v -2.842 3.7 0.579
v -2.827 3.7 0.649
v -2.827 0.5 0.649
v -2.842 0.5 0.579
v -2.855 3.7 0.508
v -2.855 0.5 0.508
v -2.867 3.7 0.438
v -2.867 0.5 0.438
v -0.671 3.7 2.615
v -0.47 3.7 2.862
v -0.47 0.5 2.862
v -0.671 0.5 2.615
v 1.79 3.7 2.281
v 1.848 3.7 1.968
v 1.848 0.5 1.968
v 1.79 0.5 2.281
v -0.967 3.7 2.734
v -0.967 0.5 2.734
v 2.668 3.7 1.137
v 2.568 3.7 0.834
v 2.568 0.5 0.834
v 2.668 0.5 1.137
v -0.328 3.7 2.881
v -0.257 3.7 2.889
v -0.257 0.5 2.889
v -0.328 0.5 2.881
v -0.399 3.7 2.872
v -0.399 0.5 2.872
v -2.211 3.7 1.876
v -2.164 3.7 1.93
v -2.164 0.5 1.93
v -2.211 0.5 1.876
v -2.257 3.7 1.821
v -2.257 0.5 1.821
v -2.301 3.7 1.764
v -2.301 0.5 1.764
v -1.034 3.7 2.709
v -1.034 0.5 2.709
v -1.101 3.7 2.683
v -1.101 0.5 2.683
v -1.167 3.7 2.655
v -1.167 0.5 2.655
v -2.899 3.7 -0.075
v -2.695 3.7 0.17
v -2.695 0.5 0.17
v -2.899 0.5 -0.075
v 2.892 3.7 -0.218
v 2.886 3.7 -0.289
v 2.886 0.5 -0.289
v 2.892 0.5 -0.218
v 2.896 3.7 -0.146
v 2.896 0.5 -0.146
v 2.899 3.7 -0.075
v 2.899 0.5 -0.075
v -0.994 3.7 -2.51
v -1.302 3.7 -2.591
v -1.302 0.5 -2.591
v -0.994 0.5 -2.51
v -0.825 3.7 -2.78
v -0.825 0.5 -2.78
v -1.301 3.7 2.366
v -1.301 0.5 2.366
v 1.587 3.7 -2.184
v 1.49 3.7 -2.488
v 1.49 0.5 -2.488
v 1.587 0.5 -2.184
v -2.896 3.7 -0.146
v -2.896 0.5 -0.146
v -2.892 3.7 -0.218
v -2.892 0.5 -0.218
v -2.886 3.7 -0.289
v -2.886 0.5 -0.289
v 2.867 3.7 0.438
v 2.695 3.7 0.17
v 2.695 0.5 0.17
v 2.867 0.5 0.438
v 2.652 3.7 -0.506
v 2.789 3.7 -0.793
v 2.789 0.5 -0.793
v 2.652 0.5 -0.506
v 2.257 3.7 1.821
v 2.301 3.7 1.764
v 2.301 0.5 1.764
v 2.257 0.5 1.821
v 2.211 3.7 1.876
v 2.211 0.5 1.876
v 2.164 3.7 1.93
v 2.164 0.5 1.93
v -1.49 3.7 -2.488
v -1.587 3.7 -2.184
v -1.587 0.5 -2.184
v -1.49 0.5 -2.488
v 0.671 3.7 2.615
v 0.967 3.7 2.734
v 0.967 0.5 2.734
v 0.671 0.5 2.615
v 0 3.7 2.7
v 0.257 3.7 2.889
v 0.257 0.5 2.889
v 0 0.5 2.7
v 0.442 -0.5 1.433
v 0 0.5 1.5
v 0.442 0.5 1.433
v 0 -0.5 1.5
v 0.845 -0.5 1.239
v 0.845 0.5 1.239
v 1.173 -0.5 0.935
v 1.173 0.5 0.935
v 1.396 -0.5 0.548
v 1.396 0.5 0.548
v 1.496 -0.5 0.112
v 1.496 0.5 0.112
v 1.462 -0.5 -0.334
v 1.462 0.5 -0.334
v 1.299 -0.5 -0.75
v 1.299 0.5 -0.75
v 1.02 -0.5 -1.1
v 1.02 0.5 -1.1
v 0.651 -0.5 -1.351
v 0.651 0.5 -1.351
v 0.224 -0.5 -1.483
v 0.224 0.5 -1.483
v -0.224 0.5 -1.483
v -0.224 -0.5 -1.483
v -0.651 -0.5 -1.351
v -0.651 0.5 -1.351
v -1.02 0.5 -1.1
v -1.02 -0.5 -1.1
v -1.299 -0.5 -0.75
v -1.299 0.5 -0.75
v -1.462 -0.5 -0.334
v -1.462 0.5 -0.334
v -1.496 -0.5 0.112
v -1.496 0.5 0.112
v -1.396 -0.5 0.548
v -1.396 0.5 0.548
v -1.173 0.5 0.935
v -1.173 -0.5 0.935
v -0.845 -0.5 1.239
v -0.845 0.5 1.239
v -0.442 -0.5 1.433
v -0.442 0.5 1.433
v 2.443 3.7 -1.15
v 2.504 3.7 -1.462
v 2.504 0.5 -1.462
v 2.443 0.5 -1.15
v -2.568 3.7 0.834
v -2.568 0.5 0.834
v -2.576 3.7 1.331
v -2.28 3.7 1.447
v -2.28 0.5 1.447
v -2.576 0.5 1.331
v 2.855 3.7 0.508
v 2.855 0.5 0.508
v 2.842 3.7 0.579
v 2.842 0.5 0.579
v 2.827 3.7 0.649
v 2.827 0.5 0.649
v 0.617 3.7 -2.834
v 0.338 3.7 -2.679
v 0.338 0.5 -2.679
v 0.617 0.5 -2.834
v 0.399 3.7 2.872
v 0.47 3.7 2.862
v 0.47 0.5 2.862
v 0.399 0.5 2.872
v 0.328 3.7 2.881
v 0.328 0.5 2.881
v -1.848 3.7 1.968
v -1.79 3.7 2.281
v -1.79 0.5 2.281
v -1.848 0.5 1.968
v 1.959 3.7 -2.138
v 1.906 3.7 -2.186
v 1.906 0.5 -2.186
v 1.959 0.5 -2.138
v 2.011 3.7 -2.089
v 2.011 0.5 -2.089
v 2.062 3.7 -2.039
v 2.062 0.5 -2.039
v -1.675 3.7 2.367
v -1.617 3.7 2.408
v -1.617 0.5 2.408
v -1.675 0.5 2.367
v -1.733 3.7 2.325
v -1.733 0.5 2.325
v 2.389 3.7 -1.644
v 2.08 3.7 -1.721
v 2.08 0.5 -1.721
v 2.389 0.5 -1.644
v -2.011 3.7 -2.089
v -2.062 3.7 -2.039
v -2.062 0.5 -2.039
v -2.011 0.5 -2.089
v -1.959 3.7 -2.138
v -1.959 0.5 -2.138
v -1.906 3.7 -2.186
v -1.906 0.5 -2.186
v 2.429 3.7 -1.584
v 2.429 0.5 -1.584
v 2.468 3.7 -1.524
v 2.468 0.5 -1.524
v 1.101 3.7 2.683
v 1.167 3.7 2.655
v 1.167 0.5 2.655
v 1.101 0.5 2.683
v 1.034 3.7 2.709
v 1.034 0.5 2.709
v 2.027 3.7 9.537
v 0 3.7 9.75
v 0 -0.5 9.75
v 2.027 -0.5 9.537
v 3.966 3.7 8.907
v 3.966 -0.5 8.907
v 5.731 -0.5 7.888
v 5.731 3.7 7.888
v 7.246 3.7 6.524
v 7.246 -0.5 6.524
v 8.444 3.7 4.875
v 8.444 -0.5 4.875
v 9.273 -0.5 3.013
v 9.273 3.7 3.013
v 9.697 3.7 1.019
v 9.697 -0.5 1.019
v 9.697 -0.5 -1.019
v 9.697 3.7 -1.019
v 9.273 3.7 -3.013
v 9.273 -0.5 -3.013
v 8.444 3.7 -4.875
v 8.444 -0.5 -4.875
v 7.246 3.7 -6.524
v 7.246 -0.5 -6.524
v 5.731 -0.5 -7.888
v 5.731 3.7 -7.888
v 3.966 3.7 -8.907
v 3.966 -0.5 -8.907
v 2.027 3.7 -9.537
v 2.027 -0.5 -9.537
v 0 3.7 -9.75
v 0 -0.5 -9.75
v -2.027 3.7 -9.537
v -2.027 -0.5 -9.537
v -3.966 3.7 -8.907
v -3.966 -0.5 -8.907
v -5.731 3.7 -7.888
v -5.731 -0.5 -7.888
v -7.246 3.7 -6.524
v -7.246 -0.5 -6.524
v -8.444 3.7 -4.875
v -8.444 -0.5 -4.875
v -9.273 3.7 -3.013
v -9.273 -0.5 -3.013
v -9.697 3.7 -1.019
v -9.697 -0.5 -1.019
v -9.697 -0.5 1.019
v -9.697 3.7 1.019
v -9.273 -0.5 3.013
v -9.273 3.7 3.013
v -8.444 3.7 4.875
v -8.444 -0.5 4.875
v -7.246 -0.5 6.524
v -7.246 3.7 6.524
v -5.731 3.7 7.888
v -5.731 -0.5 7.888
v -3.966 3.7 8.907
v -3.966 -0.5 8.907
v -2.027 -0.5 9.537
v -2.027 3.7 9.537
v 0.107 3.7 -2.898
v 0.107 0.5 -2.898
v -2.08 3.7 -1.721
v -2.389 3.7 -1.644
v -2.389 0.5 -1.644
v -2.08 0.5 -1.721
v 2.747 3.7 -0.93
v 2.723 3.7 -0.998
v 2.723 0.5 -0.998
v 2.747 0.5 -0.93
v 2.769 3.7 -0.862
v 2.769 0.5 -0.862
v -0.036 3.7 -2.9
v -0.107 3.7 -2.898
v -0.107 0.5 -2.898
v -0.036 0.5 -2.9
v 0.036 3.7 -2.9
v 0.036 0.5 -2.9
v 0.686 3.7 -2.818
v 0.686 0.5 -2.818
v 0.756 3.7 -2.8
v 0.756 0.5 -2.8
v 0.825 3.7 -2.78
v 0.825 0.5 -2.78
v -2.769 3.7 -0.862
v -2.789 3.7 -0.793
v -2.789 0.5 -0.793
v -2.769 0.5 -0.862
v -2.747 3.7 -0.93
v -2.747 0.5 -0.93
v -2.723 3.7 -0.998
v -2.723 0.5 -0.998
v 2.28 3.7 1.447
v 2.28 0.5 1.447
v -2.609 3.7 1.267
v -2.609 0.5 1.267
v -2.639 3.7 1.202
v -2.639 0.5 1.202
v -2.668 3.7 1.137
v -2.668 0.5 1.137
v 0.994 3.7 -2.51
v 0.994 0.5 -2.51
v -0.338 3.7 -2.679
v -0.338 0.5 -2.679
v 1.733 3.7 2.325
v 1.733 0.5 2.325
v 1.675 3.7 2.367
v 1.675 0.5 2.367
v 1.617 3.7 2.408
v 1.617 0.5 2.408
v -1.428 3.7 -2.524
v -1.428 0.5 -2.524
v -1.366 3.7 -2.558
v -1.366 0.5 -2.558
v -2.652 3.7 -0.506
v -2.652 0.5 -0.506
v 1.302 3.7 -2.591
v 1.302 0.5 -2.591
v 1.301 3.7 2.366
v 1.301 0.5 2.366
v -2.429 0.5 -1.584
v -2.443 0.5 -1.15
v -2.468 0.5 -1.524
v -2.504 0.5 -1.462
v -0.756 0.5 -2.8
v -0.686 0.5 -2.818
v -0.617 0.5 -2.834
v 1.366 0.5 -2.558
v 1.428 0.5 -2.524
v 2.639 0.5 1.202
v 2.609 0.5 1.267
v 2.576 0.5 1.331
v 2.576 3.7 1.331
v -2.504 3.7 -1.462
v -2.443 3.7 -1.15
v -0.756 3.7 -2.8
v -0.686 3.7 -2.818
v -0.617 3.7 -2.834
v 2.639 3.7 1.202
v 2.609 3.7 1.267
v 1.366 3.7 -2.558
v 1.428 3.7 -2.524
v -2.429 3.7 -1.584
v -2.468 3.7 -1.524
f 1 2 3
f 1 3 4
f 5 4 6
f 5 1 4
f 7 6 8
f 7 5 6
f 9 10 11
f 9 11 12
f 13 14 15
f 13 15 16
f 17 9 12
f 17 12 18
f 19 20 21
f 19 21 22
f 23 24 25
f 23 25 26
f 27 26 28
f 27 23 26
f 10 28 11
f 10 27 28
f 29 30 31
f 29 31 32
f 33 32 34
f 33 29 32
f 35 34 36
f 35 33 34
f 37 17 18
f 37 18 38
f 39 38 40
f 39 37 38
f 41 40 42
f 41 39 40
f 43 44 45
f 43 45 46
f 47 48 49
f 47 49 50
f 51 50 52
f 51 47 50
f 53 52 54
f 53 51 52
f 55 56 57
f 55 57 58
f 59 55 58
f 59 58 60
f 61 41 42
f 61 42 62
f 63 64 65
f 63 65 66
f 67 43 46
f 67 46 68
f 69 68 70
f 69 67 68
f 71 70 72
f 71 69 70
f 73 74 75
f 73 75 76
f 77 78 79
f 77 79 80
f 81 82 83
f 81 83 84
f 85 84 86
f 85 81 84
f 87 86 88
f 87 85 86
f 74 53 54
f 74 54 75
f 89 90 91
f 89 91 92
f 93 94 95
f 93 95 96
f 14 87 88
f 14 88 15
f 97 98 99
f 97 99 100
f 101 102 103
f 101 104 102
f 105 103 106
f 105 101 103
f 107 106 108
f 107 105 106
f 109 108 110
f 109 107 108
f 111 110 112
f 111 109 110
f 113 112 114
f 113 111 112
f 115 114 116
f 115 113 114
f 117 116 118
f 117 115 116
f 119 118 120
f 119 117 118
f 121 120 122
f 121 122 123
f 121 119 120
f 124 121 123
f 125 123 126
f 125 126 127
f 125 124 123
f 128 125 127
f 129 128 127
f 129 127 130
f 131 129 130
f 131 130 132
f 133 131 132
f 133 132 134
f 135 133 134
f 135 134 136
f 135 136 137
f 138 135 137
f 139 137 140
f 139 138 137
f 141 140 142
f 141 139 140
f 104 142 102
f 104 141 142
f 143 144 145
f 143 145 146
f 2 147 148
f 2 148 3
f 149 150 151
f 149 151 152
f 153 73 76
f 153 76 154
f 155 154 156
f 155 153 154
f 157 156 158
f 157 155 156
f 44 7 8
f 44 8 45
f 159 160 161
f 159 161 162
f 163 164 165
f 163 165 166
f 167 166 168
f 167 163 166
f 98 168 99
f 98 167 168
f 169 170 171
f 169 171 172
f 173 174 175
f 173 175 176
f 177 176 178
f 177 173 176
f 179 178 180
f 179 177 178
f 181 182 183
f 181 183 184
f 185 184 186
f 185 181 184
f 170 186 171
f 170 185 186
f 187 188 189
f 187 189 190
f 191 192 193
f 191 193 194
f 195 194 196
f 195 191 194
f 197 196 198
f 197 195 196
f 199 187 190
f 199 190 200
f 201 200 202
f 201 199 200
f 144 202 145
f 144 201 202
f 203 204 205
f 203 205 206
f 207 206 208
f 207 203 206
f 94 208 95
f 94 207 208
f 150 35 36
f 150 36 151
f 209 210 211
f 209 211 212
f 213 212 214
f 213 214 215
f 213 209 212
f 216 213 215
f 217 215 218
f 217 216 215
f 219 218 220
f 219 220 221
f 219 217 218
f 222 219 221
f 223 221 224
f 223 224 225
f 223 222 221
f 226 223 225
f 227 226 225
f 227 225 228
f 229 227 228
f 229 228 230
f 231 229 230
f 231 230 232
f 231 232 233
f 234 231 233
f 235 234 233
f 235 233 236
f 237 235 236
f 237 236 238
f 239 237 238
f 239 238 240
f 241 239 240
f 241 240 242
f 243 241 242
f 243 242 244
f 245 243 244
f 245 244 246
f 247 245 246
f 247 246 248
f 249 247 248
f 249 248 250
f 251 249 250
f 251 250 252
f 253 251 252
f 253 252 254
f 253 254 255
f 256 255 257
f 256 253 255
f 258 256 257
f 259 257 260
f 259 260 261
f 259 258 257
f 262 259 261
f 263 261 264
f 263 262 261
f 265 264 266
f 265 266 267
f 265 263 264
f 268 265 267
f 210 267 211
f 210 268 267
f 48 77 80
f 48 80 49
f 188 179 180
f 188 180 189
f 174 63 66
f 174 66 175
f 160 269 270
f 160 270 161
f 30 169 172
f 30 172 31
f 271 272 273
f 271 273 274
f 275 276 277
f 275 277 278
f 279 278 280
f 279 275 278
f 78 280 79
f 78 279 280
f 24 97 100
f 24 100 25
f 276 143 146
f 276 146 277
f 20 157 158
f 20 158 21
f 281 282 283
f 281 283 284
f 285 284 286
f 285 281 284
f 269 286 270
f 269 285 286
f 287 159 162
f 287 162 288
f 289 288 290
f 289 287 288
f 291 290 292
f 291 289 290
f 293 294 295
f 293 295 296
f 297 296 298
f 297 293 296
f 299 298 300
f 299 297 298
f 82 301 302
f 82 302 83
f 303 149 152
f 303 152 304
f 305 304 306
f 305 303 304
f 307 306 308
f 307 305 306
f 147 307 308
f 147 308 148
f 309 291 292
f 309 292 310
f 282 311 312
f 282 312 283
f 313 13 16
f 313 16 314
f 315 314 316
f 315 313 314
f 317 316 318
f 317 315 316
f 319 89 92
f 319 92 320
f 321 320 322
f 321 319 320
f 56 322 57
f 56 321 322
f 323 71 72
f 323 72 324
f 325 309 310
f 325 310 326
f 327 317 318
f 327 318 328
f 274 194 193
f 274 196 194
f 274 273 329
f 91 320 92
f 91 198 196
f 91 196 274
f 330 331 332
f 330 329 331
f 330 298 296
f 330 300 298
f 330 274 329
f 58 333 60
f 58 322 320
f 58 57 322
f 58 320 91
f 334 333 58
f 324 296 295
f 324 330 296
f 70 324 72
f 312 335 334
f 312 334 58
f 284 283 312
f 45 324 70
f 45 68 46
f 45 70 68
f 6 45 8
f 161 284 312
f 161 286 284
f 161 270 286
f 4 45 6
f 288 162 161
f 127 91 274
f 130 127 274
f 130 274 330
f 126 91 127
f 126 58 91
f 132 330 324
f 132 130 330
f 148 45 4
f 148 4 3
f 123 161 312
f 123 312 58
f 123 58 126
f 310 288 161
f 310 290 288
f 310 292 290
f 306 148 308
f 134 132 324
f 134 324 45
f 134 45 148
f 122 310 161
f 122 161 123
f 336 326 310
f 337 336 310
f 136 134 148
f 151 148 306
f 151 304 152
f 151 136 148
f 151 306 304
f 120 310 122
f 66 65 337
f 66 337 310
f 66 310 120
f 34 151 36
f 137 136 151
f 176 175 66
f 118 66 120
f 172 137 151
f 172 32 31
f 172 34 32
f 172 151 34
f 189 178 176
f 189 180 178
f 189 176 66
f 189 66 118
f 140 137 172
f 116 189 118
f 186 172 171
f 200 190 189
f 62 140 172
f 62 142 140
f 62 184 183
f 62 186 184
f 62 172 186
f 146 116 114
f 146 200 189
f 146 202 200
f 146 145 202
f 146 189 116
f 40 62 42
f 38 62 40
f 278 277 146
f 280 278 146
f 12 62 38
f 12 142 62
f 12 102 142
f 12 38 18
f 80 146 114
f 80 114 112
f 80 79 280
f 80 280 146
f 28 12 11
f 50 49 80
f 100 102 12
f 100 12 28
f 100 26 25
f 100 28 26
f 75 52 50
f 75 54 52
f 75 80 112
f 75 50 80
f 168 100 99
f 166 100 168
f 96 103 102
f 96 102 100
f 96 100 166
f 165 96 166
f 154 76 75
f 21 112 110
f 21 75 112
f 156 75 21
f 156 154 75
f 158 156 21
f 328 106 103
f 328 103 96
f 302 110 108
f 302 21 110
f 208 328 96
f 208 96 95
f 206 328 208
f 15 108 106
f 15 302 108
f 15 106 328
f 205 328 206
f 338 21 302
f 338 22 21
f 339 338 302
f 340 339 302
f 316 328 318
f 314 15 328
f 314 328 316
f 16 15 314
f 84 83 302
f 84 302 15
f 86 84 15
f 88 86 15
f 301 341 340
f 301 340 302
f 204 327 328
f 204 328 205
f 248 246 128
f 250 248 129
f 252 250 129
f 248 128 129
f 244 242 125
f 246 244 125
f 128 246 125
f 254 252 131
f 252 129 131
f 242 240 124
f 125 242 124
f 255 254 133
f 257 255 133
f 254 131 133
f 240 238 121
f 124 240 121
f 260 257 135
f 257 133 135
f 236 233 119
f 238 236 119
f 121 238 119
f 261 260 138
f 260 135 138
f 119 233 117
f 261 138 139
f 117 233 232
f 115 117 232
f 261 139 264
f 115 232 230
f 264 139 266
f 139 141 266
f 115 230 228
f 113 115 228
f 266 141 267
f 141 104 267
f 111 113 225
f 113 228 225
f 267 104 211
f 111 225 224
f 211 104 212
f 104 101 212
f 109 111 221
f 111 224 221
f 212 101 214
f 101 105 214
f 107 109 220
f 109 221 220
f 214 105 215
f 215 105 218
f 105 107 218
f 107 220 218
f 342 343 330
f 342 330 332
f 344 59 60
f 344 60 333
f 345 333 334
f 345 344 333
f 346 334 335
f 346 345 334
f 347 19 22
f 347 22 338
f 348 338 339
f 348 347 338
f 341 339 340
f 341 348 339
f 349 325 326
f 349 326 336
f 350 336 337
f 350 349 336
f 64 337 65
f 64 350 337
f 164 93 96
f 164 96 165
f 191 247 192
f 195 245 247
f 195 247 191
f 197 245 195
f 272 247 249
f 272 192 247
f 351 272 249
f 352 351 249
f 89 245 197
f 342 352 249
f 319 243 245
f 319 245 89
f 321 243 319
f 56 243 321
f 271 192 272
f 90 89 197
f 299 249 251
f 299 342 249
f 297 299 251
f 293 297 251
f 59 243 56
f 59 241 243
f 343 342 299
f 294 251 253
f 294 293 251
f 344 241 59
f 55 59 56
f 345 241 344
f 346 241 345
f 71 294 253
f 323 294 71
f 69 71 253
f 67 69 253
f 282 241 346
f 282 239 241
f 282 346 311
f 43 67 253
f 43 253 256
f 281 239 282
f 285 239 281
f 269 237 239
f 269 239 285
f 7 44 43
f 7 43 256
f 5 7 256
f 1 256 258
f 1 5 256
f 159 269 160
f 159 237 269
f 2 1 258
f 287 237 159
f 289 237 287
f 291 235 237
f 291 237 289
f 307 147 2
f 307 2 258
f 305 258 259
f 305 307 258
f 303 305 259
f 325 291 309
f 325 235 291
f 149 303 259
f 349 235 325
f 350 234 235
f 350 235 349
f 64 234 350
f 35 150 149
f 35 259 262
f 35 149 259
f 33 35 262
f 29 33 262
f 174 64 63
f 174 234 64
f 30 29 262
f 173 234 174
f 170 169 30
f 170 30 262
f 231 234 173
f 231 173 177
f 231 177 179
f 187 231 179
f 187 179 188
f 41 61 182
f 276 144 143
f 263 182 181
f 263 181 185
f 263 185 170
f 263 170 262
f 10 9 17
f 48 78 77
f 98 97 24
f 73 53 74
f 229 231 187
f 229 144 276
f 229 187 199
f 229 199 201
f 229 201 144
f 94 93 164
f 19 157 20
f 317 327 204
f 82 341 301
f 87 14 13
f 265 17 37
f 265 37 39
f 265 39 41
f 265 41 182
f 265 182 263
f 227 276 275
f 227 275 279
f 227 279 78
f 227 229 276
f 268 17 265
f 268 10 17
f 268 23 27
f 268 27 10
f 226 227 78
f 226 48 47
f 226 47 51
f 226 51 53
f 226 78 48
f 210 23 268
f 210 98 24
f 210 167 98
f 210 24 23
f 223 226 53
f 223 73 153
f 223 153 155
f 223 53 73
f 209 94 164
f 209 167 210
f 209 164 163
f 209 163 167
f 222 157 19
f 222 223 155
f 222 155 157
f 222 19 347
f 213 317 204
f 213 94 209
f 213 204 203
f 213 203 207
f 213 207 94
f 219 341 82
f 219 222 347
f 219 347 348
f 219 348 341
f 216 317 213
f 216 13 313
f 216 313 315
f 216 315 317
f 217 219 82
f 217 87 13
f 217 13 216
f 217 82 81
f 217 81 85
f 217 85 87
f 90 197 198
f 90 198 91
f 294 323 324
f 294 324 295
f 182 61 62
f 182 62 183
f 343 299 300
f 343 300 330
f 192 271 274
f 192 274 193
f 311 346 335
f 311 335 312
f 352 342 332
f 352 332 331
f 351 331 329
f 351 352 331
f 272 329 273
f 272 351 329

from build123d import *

# Parameters (mm, degrees)
SKETCH2_R           = 9.75
SKETCH2_R_2         = 1.5
BOSS_EXTRUDE1_DEPTH = 0.5
BOSS_EXTRUDE2_START = 3.2
SKETCH3_R           = 9.75
BOSS_EXTRUDE2_DEPTH = 3.2


with BuildPart() as part:
    # Sketch2 → Boss-Extrude1 (new, symmetric)
    with BuildSketch(Plane(origin=(0, 0, 0), x_dir=(1, 0, 0), z_dir=(0, 1, 0))):
        with Locations(Location((0, 0, 0), (0, 0, 270))):
            Circle(SKETCH2_R)
        with Locations(Location((0, 0, 0), (0, 0, 270))):
            Circle(SKETCH2_R_2, mode=Mode.SUBTRACT)
    extrude(amount=BOSS_EXTRUDE1_DEPTH, both=True)

    # Sketch3 → Boss-Extrude2 (add)
    with BuildSketch(Plane(origin=(0, 0.5, 0), x_dir=(1, 0, 0), z_dir=(0, 1, 0)).offset(BOSS_EXTRUDE2_START)):
        with Locations(Location((0, 0, 0), (0, 0, 270))):
            Circle(SKETCH3_R)
        with BuildLine():
            Line((0.107421435, 2.898009771), (0.338399731, 2.678709694))
            Line((0.338399731, 2.678709694), (0.61665913, 2.83367809))
            ThreePointArc((0.61665913, 2.83367809), (0.721200673, 2.808891167), (0.824752316, 2.780248841))
            Line((0.824752316, 2.780248841), (0.993936292, 2.510396512))
            Line((0.993936292, 2.510396512), (1.301992734, 2.591295993))
            ThreePointArc((1.301992734, 2.591295993), (1.397085655, 2.541289372), (1.490260976, 2.48779465))
            Line((1.490260976, 2.48779465), (1.587020181, 2.184345885))
            Line((1.587020181, 2.184345885), (1.905517346, 2.186093238))
            ThreePointArc((1.905517346, 2.186093238), (1.985186607, 2.11400902), (2.062131058, 2.039023173))
            Line((2.062131058, 2.039023173), (2.080385755, 1.721044772))
            Line((2.080385755, 1.721044772), (2.389311295, 1.643530205))
            ThreePointArc((2.389311295, 1.643530205), (2.448550984, 1.553897705), (2.504429862, 1.46213237))
            Line((2.504429862, 1.46213237), (2.443033042, 1.149604087))
            Line((2.443033042, 1.149604087), (2.722976028, 0.997698125))
            ThreePointArc((2.722976028, 0.997698125), (2.758063897, 0.896149284), (2.789366126, 0.793370413))
            Line((2.789366126, 0.793370413), (2.652175577, 0.505929549))
            Line((2.652175577, 0.505929549), (2.885546163, 0.289177003))
            ThreePointArc((2.885546163, 0.289177003), (2.894277512, 0.182092507), (2.899036259, 0.074758075))
            Line((2.899036259, 0.074758075), (2.694672167, -0.169534403))
            Line((2.694672167, -0.169534403), (2.866806821, -0.437514174))
            ThreePointArc((2.866806821, -0.437514174), (2.848633027, -0.543405812), (2.826549281, -0.648551587))
            Line((2.826549281, -0.648551587), (2.567852594, -0.834345885))
            Line((2.567852594, -0.834345885), (2.667935462, -1.136714727))
            ThreePointArc((2.667935462, -1.136714727), (2.623998452, -1.234759946), (2.576459817, -1.331110368))
            Line((2.576459817, -1.331110368), (2.279685399, -1.446732346))
            Line((2.279685399, -1.446732346), (2.301427906, -1.764491312))
            ThreePointArc((2.301427906, -1.764491312), (2.234488404, -1.84852957), (2.164481907, -1.930030589))
            Line((2.164481907, -1.930030589), (1.848277186, -1.968215294))
            Line((1.848277186, -1.968215294), (1.790313171, -2.281398419))
            ThreePointArc((1.790313171, -2.281398419), (1.704577232, -2.346149284), (1.616501638, -2.40767989))
            Line((1.616501638, -2.40767989), (1.30073492, -2.366028036))
            Line((1.30073492, -2.366028036), (1.166706475, -2.654956874))
            ThreePointArc((1.166706475, -2.654956874), (1.067561203, -2.696351809), (0.966950626, -2.734045809))
            Line((0.966950626, -2.734045809), (0.671462695, -2.615174535))
            Line((0.671462695, -2.615174535), (0.469791321, -2.861694623))
            ThreePointArc((0.469791321, -2.861694623), (0.363466377, -2.877132634), (0.25664255, -2.888621575))
            Line((0.25664255, -2.888621575), (0, -2.7))
            Line((0, -2.7), (-0.25664255, -2.888621575))
            ThreePointArc((-0.25664255, -2.888621575), (-0.363466377, -2.877132634), (-0.469791321, -2.861694623))
            Line((-0.469791321, -2.861694623), (-0.671462695, -2.615174535))
            Line((-0.671462695, -2.615174535), (-0.966950626, -2.734045809))
            ThreePointArc((-0.966950626, -2.734045809), (-1.067561203, -2.696351809), (-1.166706475, -2.654956874))
            Line((-1.166706475, -2.654956874), (-1.30073492, -2.366028036))
            Line((-1.30073492, -2.366028036), (-1.616501638, -2.40767989))
            ThreePointArc((-1.616501638, -2.40767989), (-1.704577232, -2.346149284), (-1.790313171, -2.281398419))
            Line((-1.790313171, -2.281398419), (-1.848277186, -1.968215294))
            Line((-1.848277186, -1.968215294), (-2.164481907, -1.930030589))
            ThreePointArc((-2.164481907, -1.930030589), (-2.234488404, -1.84852957), (-2.301427906, -1.764491312))
            Line((-2.301427906, -1.764491312), (-2.279685399, -1.446732346))
            Line((-2.279685399, -1.446732346), (-2.576459817, -1.331110368))
            ThreePointArc((-2.576459817, -1.331110368), (-2.623998452, -1.234759946), (-2.667935462, -1.136714727))
            Line((-2.667935462, -1.136714727), (-2.567852594, -0.834345885))
            Line((-2.567852594, -0.834345885), (-2.826549281, -0.648551587))
            ThreePointArc((-2.826549281, -0.648551587), (-2.848633027, -0.543405812), (-2.866806821, -0.437514174))
            Line((-2.866806821, -0.437514174), (-2.694672167, -0.169534403))
            Line((-2.694672167, -0.169534403), (-2.899036259, 0.074758075))
            ThreePointArc((-2.899036259, 0.074758075), (-2.894277512, 0.182092507), (-2.885546163, 0.289177003))
            Line((-2.885546163, 0.289177003), (-2.652175577, 0.505929549))
            Line((-2.652175577, 0.505929549), (-2.789366126, 0.793370413))
            ThreePointArc((-2.789366126, 0.793370413), (-2.758063897, 0.896149284), (-2.722976028, 0.997698125))
            Line((-2.722976028, 0.997698125), (-2.443033042, 1.149604087))
            Line((-2.443033042, 1.149604087), (-2.504429862, 1.46213237))
            ThreePointArc((-2.504429862, 1.46213237), (-2.448550984, 1.553897705), (-2.389311295, 1.643530205))
            Line((-2.389311295, 1.643530205), (-2.080385755, 1.721044772))
            Line((-2.080385755, 1.721044772), (-2.062131058, 2.039023173))
            ThreePointArc((-2.062131058, 2.039023173), (-1.985186607, 2.11400902), (-1.905517346, 2.186093238))
            Line((-1.905517346, 2.186093238), (-1.587020181, 2.184345885))
            Line((-1.587020181, 2.184345885), (-1.490260976, 2.48779465))
            ThreePointArc((-1.490260976, 2.48779465), (-1.397085655, 2.541289372), (-1.301992734, 2.591295993))
            Line((-1.301992734, 2.591295993), (-0.993936292, 2.510396512))
            Line((-0.993936292, 2.510396512), (-0.824752316, 2.780248841))
            ThreePointArc((-0.824752316, 2.780248841), (-0.721200673, 2.808891167), (-0.61665913, 2.83367809))
            Line((-0.61665913, 2.83367809), (-0.338399731, 2.678709694))
            Line((-0.338399731, 2.678709694), (-0.107421435, 2.898009771))
            ThreePointArc((-0.107421435, 2.898009771), (0, 2.9), (0.107421435, 2.898009771))
        make_face(mode=Mode.SUBTRACT)
    extrude(amount=-BOSS_EXTRUDE2_DEPTH)


solid = part.part
